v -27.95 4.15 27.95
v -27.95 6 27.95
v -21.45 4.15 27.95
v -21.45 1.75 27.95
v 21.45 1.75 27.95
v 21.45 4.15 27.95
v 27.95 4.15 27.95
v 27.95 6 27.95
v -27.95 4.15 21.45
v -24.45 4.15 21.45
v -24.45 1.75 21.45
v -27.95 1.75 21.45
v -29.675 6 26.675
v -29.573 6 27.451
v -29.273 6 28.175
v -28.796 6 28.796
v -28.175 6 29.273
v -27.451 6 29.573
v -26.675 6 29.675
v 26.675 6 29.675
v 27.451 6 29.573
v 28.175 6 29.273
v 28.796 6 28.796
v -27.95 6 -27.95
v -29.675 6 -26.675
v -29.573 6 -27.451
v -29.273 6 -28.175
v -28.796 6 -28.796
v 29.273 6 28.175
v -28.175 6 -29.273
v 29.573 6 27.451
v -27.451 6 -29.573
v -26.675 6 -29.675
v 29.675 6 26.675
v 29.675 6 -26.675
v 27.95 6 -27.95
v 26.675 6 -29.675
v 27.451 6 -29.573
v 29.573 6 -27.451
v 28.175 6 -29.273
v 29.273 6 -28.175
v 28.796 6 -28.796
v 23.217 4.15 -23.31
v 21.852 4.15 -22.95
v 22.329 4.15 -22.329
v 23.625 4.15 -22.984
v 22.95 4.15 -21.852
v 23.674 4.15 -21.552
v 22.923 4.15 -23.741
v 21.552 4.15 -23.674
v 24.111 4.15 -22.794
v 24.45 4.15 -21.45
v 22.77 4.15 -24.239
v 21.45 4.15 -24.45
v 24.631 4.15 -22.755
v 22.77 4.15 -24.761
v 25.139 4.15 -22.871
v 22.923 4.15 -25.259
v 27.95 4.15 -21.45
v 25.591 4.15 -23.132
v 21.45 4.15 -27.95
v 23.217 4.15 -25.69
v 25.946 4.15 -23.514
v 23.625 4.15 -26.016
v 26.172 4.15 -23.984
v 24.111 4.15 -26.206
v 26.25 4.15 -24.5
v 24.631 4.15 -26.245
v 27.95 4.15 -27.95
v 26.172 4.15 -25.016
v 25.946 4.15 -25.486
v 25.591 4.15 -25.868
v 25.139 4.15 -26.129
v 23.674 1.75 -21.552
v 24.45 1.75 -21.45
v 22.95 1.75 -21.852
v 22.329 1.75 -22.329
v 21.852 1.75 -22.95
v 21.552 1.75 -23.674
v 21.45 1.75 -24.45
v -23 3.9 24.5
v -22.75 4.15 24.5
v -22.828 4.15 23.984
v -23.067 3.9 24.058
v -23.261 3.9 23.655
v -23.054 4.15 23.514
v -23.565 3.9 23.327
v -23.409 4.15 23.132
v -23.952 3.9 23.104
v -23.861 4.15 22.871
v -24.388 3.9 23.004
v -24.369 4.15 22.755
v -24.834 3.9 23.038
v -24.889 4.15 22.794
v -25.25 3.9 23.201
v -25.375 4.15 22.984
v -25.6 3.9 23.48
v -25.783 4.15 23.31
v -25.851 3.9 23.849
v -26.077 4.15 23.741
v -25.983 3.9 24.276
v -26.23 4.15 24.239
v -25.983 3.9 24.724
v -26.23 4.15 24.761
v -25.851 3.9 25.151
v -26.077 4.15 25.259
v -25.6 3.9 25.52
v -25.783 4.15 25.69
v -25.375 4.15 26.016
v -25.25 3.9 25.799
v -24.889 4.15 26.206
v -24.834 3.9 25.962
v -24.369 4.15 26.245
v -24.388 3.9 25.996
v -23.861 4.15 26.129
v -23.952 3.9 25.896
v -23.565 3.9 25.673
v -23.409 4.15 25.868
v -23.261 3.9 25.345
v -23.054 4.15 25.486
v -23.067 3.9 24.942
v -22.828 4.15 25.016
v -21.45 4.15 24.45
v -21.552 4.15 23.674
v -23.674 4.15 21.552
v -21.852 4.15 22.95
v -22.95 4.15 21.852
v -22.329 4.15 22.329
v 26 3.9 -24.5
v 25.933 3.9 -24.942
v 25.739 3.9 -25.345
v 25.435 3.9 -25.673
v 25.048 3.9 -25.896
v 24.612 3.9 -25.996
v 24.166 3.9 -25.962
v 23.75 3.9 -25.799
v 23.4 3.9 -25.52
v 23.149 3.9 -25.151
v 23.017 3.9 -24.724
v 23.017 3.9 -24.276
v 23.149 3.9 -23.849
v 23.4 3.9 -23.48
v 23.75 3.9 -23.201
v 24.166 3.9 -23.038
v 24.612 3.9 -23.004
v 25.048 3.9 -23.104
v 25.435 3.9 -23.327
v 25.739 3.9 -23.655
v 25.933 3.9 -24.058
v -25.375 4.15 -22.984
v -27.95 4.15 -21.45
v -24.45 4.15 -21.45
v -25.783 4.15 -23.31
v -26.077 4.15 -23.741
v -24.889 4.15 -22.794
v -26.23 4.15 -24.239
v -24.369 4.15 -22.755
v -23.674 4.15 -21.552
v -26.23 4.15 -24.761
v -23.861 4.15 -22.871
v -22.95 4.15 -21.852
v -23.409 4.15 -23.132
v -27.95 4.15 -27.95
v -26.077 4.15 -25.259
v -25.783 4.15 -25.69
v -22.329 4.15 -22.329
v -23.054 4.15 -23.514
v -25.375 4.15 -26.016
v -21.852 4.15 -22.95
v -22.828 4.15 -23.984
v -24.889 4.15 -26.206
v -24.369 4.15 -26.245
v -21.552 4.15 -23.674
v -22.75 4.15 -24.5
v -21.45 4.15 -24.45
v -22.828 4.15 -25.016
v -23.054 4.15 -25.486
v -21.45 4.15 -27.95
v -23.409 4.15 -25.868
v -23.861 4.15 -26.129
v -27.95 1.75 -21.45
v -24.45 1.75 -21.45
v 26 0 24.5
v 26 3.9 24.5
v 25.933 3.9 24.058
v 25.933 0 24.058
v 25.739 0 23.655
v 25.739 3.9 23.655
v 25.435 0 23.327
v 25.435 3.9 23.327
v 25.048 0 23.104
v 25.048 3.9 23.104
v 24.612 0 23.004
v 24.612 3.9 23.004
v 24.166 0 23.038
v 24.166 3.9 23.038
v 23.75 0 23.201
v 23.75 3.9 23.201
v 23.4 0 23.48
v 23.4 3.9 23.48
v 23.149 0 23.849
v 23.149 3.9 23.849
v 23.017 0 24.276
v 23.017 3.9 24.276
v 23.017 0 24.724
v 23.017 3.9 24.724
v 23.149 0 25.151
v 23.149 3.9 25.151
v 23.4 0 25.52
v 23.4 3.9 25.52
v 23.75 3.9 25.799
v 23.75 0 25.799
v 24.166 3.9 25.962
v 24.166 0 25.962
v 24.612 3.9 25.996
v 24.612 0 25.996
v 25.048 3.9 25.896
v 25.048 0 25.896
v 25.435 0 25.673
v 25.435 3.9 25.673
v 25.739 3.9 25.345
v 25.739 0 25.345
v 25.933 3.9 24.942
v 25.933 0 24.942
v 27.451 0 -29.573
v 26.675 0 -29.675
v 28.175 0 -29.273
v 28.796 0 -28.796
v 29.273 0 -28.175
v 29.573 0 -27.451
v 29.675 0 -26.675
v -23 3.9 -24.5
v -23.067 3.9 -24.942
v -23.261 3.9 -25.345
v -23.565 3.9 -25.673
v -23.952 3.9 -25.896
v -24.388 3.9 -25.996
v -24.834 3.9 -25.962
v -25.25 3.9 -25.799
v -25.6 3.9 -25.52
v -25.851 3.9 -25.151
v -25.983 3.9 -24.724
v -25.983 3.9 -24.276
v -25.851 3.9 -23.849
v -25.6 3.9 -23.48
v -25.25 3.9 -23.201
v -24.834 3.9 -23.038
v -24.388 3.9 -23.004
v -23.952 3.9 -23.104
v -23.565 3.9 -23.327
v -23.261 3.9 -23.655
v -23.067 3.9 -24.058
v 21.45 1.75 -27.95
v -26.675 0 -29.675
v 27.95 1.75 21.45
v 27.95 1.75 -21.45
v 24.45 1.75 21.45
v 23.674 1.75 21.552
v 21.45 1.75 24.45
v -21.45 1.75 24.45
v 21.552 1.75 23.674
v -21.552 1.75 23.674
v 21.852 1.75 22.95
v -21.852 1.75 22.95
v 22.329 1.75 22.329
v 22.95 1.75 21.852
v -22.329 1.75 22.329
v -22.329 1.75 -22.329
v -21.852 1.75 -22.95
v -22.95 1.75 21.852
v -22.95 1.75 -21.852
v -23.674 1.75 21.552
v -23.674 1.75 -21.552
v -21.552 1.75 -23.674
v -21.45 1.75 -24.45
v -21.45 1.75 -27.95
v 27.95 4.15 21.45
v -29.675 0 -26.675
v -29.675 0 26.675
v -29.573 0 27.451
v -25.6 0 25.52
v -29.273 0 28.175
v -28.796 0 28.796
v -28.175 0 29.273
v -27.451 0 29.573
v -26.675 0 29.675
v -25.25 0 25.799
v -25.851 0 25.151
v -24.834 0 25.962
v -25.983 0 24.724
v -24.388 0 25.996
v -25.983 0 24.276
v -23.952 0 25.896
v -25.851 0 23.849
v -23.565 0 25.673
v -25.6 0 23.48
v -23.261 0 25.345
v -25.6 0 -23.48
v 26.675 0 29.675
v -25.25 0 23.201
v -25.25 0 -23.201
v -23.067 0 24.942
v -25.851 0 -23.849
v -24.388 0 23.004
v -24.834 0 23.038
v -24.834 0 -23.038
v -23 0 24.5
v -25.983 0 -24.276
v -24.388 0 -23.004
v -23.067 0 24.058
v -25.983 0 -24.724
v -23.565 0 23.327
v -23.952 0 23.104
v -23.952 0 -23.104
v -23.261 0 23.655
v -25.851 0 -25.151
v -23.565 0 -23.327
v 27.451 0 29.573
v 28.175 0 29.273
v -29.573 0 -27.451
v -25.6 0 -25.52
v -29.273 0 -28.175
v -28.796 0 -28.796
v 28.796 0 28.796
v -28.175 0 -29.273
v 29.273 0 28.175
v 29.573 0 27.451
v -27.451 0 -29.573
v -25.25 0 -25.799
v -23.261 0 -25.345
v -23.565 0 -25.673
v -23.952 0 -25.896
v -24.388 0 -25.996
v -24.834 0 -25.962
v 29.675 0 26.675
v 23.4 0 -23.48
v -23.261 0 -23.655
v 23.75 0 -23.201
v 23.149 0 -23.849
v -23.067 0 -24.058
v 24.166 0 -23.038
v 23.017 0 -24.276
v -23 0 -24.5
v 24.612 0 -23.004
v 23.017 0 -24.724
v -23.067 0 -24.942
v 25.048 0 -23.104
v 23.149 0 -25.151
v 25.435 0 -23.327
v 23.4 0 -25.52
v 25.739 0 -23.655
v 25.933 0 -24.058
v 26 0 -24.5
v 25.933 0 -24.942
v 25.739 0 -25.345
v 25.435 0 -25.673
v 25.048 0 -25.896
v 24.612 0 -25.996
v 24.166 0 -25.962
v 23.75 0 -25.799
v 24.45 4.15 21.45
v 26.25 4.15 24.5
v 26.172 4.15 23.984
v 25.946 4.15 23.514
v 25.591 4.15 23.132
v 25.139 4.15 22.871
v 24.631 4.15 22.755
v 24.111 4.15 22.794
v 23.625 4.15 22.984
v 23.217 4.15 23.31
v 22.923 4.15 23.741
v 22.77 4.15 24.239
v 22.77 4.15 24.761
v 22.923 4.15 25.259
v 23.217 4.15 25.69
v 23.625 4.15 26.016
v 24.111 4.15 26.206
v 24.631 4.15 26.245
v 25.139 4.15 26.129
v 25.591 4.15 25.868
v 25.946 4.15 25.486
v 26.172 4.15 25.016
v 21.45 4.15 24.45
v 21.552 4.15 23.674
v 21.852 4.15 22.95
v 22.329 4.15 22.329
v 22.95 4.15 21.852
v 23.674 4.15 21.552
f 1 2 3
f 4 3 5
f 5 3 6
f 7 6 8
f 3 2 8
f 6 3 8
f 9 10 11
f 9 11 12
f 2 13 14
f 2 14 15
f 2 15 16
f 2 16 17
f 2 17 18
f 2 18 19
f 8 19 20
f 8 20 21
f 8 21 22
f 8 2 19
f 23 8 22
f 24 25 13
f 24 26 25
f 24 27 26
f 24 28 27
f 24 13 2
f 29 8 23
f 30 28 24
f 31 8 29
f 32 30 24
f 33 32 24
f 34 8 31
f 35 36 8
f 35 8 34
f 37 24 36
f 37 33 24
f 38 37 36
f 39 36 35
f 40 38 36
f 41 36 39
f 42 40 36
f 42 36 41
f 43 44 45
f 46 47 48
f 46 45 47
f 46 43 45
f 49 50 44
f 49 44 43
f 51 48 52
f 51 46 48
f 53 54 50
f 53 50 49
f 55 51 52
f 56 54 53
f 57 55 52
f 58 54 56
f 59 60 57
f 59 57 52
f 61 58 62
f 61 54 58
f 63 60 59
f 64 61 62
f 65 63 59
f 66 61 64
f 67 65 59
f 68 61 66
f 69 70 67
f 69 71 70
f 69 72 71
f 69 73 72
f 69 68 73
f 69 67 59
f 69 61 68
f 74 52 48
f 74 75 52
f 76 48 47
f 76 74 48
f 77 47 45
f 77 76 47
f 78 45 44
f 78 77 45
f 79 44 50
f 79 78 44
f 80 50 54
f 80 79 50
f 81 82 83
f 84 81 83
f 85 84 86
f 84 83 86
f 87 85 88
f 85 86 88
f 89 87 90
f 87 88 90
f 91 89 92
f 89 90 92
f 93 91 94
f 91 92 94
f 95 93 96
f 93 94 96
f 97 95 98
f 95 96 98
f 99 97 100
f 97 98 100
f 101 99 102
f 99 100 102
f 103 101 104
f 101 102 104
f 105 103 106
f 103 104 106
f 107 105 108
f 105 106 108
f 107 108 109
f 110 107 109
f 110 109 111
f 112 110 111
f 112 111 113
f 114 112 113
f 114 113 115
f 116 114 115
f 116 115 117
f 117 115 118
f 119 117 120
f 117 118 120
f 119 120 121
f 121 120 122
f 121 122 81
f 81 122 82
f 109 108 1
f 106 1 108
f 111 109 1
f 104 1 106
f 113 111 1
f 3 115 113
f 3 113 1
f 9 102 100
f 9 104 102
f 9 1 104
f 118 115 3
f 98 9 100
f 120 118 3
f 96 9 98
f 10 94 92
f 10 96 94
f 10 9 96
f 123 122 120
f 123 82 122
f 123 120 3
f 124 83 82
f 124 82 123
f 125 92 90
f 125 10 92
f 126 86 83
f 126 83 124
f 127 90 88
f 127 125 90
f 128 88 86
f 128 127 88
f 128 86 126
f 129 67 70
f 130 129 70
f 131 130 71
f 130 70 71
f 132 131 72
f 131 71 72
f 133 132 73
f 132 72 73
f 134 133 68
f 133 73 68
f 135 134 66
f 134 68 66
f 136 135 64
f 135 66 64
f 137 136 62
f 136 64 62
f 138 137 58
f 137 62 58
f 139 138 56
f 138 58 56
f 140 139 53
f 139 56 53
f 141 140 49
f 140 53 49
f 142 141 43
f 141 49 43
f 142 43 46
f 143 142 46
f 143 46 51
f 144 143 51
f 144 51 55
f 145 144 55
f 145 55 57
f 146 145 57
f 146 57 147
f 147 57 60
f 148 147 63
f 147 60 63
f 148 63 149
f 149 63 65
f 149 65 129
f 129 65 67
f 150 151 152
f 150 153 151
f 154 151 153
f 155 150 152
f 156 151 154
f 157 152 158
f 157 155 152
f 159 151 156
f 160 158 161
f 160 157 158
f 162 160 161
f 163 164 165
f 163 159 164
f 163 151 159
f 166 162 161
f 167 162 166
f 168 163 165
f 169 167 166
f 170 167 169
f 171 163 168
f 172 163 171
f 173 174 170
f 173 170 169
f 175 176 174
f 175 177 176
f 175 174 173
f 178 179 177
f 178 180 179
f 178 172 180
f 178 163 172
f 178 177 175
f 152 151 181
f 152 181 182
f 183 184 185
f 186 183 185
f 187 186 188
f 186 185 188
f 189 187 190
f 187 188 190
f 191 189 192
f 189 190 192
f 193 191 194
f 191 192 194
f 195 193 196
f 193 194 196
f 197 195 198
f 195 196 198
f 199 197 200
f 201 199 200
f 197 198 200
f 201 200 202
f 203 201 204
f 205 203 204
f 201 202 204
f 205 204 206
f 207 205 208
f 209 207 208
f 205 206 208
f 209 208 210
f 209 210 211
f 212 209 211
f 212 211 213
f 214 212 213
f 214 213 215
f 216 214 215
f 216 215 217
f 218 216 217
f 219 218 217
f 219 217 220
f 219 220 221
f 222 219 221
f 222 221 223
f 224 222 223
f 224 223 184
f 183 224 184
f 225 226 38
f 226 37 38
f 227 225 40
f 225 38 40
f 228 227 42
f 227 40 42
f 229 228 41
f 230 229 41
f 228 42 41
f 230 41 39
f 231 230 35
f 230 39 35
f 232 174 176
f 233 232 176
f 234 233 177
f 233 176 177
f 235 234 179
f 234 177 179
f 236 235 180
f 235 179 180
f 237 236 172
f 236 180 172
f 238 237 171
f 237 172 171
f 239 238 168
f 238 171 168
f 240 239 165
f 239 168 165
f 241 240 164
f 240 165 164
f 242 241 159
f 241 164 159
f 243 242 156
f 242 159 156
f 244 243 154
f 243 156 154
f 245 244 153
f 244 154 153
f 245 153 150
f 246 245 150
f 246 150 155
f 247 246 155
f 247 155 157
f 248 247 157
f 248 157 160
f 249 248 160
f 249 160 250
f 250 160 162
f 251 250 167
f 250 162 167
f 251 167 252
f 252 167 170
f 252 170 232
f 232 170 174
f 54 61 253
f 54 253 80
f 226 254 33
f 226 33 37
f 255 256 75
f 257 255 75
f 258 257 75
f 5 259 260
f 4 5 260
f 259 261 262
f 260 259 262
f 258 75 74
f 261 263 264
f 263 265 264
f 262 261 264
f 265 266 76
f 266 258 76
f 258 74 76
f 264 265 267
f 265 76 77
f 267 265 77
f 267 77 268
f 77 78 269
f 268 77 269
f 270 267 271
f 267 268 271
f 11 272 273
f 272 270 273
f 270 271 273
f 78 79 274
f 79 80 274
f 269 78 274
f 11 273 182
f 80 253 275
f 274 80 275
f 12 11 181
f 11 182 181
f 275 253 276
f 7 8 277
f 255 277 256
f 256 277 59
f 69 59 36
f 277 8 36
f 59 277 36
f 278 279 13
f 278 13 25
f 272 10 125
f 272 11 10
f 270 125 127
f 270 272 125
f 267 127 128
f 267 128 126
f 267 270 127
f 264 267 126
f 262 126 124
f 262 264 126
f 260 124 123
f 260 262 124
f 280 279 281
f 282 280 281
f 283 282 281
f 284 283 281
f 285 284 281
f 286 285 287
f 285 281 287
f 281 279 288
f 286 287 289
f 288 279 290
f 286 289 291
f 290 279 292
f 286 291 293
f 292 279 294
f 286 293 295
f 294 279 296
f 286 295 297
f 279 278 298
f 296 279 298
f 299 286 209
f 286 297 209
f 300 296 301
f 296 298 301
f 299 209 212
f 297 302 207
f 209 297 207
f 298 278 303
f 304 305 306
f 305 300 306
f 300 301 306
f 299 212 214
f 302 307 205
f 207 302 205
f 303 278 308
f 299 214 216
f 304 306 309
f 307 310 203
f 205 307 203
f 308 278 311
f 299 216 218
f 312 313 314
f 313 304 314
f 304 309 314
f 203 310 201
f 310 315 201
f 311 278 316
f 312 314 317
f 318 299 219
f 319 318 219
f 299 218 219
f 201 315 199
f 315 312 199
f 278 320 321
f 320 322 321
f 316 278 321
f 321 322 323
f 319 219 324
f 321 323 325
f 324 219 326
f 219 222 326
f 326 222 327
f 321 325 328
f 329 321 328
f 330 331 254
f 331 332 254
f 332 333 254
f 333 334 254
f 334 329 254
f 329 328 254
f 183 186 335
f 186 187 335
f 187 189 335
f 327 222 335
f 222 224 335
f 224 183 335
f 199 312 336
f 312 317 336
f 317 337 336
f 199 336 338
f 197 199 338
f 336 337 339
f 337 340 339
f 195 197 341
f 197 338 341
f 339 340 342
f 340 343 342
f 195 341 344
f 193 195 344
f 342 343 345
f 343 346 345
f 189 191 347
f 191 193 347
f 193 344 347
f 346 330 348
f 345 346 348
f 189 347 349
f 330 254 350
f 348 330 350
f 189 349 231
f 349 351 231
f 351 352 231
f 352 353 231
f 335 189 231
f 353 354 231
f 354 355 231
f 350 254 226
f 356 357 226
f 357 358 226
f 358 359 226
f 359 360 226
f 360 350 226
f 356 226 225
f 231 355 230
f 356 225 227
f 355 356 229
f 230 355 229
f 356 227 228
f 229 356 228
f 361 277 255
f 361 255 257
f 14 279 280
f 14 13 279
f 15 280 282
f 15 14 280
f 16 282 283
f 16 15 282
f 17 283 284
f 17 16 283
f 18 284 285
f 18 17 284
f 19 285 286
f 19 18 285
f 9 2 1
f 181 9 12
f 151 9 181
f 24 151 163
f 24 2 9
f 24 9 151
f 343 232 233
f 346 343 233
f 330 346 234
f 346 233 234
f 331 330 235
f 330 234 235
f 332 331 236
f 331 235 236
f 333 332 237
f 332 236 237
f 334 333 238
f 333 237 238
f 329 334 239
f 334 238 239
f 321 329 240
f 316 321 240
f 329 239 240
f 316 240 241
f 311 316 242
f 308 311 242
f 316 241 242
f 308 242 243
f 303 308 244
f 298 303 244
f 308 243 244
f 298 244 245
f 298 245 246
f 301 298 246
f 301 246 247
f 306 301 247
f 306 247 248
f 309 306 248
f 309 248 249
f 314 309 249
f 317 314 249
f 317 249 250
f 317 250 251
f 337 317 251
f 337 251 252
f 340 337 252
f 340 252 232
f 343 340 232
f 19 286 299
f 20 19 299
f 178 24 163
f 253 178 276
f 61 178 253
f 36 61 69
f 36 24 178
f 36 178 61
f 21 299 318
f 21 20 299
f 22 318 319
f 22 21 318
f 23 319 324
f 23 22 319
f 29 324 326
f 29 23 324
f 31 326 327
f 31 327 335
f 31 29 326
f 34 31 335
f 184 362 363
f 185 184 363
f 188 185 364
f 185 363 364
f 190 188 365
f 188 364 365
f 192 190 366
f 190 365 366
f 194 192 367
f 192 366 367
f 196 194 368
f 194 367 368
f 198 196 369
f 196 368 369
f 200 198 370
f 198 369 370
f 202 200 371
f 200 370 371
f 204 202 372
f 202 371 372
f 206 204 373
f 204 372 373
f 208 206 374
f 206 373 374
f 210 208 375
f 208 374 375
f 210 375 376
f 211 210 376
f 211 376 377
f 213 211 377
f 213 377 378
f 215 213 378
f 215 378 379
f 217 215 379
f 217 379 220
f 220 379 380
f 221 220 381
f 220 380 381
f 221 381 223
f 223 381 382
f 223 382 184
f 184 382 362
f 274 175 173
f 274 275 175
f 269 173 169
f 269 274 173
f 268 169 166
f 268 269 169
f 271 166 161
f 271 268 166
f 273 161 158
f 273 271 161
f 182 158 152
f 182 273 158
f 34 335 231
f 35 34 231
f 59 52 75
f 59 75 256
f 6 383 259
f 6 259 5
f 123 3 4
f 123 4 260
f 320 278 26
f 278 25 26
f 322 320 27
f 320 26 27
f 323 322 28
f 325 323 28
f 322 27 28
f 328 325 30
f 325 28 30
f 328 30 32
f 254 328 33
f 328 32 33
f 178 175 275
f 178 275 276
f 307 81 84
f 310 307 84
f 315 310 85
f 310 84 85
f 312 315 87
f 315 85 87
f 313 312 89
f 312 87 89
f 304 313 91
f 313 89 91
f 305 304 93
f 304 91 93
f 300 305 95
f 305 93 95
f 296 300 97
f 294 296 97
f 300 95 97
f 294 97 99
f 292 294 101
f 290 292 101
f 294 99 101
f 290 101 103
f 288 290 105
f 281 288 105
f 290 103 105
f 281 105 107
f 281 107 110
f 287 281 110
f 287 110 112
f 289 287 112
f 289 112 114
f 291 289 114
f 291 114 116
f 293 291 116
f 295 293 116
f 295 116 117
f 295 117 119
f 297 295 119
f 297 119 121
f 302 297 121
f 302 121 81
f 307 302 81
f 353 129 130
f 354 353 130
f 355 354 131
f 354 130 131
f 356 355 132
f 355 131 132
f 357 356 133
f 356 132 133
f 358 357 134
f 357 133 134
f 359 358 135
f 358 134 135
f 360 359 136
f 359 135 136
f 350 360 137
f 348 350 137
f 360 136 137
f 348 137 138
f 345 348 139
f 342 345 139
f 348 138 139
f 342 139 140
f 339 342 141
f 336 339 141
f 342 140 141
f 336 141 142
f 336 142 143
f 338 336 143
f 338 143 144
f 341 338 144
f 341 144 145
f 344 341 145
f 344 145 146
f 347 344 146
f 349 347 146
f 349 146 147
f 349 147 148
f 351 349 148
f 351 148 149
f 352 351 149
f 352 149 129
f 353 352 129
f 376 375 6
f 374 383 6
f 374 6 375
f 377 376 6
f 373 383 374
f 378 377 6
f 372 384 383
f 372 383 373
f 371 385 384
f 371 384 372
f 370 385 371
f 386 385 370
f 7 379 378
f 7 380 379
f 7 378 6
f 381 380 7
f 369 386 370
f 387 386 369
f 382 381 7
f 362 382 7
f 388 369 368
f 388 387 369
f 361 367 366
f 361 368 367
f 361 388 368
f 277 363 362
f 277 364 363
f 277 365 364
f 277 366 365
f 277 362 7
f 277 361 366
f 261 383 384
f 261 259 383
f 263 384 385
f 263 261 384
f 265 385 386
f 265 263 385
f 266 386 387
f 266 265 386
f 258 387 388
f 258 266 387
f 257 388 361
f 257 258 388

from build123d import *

# Parameters (mm, degrees)
SKETCH1_W           = 59.35
SKETCH1_H           = 59.35
BOSS_EXTRUDE1_DEPTH = 6
SKETCH2_R           = 1.5
CUT_EXTRUDE1_DEPTH  = 7
SKETCH7_W           = 55.9
SKETCH7_H           = 55.9
CUT_EXTRUDE3_DEPTH  = 1.85
CUT_EXTRUDE4_DEPTH  = 2.4
FILLET1_R           = 3
CHAMFER1_SIZE       = 0.25


with BuildPart() as part:
    # Sketch1 → Boss-Extrude1 (new body)
    with BuildSketch(Plane(origin=(0, 0, 0), x_dir=(1, 0, 0), z_dir=(0, 1, 0))):
        Rectangle(SKETCH1_W, SKETCH1_H)
    extrude(amount=BOSS_EXTRUDE1_DEPTH)

    # Sketch2 → Cut-Extrude1 (cut, through all)
    with BuildSketch(Plane(origin=(0, 6, 0), x_dir=(1, 0, 0), z_dir=(0, 1, 0))):
        with Locations((-24.5, 24.5)):
            Circle(SKETCH2_R)
        with Locations((24.5, 24.5)):
            Circle(SKETCH2_R)
        with Locations((-24.5, -24.5)):
            Circle(SKETCH2_R)
        with Locations((24.5, -24.5)):
            Circle(SKETCH2_R)
    extrude(amount=-CUT_EXTRUDE1_DEPTH, mode=Mode.SUBTRACT)

    # Sketch7 → Cut-Extrude3 (cut)
    with BuildSketch(Plane(origin=(0, 6, 0), x_dir=(1, 0, 0), z_dir=(0, 1, 0))):
        Rectangle(SKETCH7_W, SKETCH7_H)
    extrude(amount=-CUT_EXTRUDE3_DEPTH, mode=Mode.SUBTRACT)

    # Sketch8 → Cut-Extrude4 (cut)
    with BuildSketch(Plane(origin=(0, 4.15, 0), x_dir=(1, 0, 0), z_dir=(0, 1, 0))):
        Polygon((-27.95, 21.45), (-21.45, 21.45), (-21.45, 27.95), (21.45, 27.95), (21.45, 21.45), (27.95, 21.45), (27.95, -21.45), (21.45, -21.45), (21.45, -27.95), (-21.45, -27.95), (-21.45, -21.45), (-27.95, -21.45), align=None)
    extrude(amount=-CUT_EXTRUDE4_DEPTH, mode=Mode.SUBTRACT)

    # Fillet1
    fillet1_edges = [part.edges().sort_by_distance(p)[0] for p in [
        (-21.45, 2.95, -21.45),
        (21.45, 2.95, -21.45),
        (21.45, 2.95, 21.45),
        (-21.45, 2.95, 21.45),
        (-29.675, 3, 29.675),
        (-29.675, 3, -29.675),
        (29.675, 3, -29.675),
        (29.675, 3, 29.675),
    ]]
    fillet(fillet1_edges, radius=FILLET1_R)

    # Chamfer1
    chamfer1_edges = [part.edges().sort_by_distance(p)[0] for p in [
        (-26, 4.15, -24.5),
        (23, 4.15, 24.5),
        (-26, 4.15, 24.5),
        (23, 4.15, -24.5),
    ]]
    chamfer(chamfer1_edges, length=CHAMFER1_SIZE)


solid = part.part
